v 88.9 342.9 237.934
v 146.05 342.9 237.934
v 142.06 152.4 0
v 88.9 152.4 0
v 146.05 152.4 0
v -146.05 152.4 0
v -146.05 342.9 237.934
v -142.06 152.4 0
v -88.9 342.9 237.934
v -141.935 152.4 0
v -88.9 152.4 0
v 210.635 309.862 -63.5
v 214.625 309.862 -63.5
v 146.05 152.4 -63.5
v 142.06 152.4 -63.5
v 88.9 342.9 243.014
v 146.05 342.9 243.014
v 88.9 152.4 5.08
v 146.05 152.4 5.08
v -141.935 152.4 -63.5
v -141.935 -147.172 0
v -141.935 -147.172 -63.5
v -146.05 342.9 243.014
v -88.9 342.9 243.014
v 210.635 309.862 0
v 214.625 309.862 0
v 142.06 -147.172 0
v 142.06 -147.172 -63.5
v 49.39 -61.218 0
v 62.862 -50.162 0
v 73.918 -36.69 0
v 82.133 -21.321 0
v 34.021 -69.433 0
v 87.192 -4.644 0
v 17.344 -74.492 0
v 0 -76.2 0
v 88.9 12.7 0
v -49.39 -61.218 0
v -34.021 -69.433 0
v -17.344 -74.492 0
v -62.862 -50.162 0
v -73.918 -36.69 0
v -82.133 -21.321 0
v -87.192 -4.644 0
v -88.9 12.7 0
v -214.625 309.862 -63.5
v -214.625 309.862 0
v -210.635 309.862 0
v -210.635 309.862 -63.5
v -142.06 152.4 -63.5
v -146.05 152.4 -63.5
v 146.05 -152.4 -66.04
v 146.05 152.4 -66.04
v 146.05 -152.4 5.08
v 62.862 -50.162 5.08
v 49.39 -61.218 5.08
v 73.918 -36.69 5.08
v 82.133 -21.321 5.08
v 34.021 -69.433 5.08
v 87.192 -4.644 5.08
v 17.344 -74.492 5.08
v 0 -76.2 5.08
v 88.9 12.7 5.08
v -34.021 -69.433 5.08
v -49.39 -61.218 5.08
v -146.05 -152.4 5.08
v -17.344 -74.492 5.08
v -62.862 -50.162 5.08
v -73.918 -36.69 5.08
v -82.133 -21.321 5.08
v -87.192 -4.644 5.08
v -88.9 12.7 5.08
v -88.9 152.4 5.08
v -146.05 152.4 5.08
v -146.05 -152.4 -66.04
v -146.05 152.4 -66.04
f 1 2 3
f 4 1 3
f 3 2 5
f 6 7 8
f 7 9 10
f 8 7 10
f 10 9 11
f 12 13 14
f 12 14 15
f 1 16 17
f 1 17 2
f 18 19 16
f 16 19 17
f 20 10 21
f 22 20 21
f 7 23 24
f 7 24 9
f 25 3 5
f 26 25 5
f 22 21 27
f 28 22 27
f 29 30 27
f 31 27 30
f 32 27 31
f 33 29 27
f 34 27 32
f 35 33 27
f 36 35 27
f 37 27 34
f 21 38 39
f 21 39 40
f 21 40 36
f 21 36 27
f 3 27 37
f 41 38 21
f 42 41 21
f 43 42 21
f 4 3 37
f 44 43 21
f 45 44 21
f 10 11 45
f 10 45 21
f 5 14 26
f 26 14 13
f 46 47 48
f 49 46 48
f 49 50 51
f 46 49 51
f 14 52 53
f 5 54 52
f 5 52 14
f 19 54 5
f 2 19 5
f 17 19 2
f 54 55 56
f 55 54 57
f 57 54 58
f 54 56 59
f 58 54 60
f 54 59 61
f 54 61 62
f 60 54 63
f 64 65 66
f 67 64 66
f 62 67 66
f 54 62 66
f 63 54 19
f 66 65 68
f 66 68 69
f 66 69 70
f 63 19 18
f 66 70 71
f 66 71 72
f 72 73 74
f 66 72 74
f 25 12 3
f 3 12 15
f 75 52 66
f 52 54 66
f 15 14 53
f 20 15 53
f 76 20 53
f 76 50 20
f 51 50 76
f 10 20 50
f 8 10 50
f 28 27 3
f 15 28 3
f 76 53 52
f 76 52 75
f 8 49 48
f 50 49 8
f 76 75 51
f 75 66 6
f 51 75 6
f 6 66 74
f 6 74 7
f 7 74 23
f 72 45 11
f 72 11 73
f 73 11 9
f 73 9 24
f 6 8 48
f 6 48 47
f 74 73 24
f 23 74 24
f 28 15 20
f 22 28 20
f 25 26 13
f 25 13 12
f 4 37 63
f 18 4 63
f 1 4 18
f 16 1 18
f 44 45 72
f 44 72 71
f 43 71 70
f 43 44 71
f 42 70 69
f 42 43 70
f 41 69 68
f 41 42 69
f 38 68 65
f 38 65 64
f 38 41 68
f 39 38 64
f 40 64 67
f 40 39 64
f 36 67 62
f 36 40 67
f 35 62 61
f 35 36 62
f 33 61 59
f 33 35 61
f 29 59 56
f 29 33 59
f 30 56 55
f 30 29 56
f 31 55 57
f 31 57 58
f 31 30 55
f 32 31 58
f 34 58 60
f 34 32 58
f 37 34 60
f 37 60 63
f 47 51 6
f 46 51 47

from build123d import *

# Parameters (mm, degrees)
BOSS_EXTRUDE1_DEPTH = 5.08
BOSS_EXTRUDE2_DEPTH = 57.15
BOSS_EXTRUDE3_DEPTH = 63.5
BOSS_EXTRUDE4_DEPTH = 63.5
BOSS_EXTRUDE5_DEPTH = 57.15
SKETCH7_W           = 292.1
SKETCH7_H           = 304.8
BOSS_EXTRUDE6_DEPTH = 2.54


with BuildPart() as part:
    # Sketch1 → Boss-Extrude1 (new body)
    with BuildSketch(Plane.XY):
        with BuildLine():
            Line((-88.9, 152.4), (-88.9, 12.7))
            ThreePointArc((-88.9, 12.7), (0, -76.2), (88.9, 12.7))
            Line((88.9, 12.7), (88.9, 152.4))
            Line((88.9, 152.4), (146.05, 152.4))
            Line((146.05, 152.4), (146.05, -152.4))
            Line((146.05, -152.4), (-146.05, -152.4))
            Line((-146.05, -152.4), (-146.05, 152.4))
            Line((-146.05, 152.4), (-88.9, 152.4))
        make_face()
    extrude(amount=BOSS_EXTRUDE1_DEPTH)

    # Sketch2 → Boss-Extrude2 (add)
    with BuildSketch(Plane(origin=(146.05, 0, 0), x_dir=(0, 0, -1), z_dir=(1, 0, 0))):
        Polygon((-5.08, 152.4), (-243.014423739, 342.9), (-237.934423739, 342.9), (0, 152.4), align=None)
    extrude(amount=-BOSS_EXTRUDE2_DEPTH)

    # Sketch3 → Boss-Extrude3 (add)
    with BuildSketch(Plane(origin=(0, 0, 0), x_dir=(-1, 0, 0), z_dir=(0, 0, -1))):
        Polygon((141.934676661, -147.172428926), (-142.059608363, -147.172428926), (-142.059608363, 152.4), (-146.05, 152.4), (-146.05, -152.4), (146.05, -152.4), (146.05, 152.4), (141.934676661, 152.4), align=None)
    extrude(amount=BOSS_EXTRUDE3_DEPTH)

    # Sketch4 → Boss-Extrude4 (add)
    with BuildSketch(Plane(origin=(0, 0, -63.5), x_dir=(-1, 0, 0), z_dir=(0, 0, -1))):
        Polygon((-146.05, 152.4), (-214.625070232, 309.862442089), (-210.634678595, 309.862442089), (-142.059608363, 152.4), align=None)
    boss_extrude4 = extrude(amount=-BOSS_EXTRUDE4_DEPTH)

    # Mirror3: Boss-Extrude4 across plane
    add(boss_extrude4.mirror(Plane(origin=(0, 0, 0), x_dir=(0, 0, 1), z_dir=(1, 0, 0))))

    # Sketch6 → Boss-Extrude5 (add)
    with BuildSketch(Plane(origin=(-88.9, 0, 0), x_dir=(0, 0, -1), z_dir=(1, 0, 0))):
        Polygon((-5.08, 152.4), (-243.014423739, 342.9), (-237.934423739, 342.9), (0, 152.4), align=None)
    extrude(amount=-BOSS_EXTRUDE5_DEPTH)

    # Sketch7 → Boss-Extrude6 (add)
    with BuildSketch(Plane(origin=(0, 0, -63.5), x_dir=(-1, 0, 0), z_dir=(0, 0, -1))):
        Rectangle(SKETCH7_W, SKETCH7_H)
    extrude(amount=BOSS_EXTRUDE6_DEPTH)


solid = part.part
